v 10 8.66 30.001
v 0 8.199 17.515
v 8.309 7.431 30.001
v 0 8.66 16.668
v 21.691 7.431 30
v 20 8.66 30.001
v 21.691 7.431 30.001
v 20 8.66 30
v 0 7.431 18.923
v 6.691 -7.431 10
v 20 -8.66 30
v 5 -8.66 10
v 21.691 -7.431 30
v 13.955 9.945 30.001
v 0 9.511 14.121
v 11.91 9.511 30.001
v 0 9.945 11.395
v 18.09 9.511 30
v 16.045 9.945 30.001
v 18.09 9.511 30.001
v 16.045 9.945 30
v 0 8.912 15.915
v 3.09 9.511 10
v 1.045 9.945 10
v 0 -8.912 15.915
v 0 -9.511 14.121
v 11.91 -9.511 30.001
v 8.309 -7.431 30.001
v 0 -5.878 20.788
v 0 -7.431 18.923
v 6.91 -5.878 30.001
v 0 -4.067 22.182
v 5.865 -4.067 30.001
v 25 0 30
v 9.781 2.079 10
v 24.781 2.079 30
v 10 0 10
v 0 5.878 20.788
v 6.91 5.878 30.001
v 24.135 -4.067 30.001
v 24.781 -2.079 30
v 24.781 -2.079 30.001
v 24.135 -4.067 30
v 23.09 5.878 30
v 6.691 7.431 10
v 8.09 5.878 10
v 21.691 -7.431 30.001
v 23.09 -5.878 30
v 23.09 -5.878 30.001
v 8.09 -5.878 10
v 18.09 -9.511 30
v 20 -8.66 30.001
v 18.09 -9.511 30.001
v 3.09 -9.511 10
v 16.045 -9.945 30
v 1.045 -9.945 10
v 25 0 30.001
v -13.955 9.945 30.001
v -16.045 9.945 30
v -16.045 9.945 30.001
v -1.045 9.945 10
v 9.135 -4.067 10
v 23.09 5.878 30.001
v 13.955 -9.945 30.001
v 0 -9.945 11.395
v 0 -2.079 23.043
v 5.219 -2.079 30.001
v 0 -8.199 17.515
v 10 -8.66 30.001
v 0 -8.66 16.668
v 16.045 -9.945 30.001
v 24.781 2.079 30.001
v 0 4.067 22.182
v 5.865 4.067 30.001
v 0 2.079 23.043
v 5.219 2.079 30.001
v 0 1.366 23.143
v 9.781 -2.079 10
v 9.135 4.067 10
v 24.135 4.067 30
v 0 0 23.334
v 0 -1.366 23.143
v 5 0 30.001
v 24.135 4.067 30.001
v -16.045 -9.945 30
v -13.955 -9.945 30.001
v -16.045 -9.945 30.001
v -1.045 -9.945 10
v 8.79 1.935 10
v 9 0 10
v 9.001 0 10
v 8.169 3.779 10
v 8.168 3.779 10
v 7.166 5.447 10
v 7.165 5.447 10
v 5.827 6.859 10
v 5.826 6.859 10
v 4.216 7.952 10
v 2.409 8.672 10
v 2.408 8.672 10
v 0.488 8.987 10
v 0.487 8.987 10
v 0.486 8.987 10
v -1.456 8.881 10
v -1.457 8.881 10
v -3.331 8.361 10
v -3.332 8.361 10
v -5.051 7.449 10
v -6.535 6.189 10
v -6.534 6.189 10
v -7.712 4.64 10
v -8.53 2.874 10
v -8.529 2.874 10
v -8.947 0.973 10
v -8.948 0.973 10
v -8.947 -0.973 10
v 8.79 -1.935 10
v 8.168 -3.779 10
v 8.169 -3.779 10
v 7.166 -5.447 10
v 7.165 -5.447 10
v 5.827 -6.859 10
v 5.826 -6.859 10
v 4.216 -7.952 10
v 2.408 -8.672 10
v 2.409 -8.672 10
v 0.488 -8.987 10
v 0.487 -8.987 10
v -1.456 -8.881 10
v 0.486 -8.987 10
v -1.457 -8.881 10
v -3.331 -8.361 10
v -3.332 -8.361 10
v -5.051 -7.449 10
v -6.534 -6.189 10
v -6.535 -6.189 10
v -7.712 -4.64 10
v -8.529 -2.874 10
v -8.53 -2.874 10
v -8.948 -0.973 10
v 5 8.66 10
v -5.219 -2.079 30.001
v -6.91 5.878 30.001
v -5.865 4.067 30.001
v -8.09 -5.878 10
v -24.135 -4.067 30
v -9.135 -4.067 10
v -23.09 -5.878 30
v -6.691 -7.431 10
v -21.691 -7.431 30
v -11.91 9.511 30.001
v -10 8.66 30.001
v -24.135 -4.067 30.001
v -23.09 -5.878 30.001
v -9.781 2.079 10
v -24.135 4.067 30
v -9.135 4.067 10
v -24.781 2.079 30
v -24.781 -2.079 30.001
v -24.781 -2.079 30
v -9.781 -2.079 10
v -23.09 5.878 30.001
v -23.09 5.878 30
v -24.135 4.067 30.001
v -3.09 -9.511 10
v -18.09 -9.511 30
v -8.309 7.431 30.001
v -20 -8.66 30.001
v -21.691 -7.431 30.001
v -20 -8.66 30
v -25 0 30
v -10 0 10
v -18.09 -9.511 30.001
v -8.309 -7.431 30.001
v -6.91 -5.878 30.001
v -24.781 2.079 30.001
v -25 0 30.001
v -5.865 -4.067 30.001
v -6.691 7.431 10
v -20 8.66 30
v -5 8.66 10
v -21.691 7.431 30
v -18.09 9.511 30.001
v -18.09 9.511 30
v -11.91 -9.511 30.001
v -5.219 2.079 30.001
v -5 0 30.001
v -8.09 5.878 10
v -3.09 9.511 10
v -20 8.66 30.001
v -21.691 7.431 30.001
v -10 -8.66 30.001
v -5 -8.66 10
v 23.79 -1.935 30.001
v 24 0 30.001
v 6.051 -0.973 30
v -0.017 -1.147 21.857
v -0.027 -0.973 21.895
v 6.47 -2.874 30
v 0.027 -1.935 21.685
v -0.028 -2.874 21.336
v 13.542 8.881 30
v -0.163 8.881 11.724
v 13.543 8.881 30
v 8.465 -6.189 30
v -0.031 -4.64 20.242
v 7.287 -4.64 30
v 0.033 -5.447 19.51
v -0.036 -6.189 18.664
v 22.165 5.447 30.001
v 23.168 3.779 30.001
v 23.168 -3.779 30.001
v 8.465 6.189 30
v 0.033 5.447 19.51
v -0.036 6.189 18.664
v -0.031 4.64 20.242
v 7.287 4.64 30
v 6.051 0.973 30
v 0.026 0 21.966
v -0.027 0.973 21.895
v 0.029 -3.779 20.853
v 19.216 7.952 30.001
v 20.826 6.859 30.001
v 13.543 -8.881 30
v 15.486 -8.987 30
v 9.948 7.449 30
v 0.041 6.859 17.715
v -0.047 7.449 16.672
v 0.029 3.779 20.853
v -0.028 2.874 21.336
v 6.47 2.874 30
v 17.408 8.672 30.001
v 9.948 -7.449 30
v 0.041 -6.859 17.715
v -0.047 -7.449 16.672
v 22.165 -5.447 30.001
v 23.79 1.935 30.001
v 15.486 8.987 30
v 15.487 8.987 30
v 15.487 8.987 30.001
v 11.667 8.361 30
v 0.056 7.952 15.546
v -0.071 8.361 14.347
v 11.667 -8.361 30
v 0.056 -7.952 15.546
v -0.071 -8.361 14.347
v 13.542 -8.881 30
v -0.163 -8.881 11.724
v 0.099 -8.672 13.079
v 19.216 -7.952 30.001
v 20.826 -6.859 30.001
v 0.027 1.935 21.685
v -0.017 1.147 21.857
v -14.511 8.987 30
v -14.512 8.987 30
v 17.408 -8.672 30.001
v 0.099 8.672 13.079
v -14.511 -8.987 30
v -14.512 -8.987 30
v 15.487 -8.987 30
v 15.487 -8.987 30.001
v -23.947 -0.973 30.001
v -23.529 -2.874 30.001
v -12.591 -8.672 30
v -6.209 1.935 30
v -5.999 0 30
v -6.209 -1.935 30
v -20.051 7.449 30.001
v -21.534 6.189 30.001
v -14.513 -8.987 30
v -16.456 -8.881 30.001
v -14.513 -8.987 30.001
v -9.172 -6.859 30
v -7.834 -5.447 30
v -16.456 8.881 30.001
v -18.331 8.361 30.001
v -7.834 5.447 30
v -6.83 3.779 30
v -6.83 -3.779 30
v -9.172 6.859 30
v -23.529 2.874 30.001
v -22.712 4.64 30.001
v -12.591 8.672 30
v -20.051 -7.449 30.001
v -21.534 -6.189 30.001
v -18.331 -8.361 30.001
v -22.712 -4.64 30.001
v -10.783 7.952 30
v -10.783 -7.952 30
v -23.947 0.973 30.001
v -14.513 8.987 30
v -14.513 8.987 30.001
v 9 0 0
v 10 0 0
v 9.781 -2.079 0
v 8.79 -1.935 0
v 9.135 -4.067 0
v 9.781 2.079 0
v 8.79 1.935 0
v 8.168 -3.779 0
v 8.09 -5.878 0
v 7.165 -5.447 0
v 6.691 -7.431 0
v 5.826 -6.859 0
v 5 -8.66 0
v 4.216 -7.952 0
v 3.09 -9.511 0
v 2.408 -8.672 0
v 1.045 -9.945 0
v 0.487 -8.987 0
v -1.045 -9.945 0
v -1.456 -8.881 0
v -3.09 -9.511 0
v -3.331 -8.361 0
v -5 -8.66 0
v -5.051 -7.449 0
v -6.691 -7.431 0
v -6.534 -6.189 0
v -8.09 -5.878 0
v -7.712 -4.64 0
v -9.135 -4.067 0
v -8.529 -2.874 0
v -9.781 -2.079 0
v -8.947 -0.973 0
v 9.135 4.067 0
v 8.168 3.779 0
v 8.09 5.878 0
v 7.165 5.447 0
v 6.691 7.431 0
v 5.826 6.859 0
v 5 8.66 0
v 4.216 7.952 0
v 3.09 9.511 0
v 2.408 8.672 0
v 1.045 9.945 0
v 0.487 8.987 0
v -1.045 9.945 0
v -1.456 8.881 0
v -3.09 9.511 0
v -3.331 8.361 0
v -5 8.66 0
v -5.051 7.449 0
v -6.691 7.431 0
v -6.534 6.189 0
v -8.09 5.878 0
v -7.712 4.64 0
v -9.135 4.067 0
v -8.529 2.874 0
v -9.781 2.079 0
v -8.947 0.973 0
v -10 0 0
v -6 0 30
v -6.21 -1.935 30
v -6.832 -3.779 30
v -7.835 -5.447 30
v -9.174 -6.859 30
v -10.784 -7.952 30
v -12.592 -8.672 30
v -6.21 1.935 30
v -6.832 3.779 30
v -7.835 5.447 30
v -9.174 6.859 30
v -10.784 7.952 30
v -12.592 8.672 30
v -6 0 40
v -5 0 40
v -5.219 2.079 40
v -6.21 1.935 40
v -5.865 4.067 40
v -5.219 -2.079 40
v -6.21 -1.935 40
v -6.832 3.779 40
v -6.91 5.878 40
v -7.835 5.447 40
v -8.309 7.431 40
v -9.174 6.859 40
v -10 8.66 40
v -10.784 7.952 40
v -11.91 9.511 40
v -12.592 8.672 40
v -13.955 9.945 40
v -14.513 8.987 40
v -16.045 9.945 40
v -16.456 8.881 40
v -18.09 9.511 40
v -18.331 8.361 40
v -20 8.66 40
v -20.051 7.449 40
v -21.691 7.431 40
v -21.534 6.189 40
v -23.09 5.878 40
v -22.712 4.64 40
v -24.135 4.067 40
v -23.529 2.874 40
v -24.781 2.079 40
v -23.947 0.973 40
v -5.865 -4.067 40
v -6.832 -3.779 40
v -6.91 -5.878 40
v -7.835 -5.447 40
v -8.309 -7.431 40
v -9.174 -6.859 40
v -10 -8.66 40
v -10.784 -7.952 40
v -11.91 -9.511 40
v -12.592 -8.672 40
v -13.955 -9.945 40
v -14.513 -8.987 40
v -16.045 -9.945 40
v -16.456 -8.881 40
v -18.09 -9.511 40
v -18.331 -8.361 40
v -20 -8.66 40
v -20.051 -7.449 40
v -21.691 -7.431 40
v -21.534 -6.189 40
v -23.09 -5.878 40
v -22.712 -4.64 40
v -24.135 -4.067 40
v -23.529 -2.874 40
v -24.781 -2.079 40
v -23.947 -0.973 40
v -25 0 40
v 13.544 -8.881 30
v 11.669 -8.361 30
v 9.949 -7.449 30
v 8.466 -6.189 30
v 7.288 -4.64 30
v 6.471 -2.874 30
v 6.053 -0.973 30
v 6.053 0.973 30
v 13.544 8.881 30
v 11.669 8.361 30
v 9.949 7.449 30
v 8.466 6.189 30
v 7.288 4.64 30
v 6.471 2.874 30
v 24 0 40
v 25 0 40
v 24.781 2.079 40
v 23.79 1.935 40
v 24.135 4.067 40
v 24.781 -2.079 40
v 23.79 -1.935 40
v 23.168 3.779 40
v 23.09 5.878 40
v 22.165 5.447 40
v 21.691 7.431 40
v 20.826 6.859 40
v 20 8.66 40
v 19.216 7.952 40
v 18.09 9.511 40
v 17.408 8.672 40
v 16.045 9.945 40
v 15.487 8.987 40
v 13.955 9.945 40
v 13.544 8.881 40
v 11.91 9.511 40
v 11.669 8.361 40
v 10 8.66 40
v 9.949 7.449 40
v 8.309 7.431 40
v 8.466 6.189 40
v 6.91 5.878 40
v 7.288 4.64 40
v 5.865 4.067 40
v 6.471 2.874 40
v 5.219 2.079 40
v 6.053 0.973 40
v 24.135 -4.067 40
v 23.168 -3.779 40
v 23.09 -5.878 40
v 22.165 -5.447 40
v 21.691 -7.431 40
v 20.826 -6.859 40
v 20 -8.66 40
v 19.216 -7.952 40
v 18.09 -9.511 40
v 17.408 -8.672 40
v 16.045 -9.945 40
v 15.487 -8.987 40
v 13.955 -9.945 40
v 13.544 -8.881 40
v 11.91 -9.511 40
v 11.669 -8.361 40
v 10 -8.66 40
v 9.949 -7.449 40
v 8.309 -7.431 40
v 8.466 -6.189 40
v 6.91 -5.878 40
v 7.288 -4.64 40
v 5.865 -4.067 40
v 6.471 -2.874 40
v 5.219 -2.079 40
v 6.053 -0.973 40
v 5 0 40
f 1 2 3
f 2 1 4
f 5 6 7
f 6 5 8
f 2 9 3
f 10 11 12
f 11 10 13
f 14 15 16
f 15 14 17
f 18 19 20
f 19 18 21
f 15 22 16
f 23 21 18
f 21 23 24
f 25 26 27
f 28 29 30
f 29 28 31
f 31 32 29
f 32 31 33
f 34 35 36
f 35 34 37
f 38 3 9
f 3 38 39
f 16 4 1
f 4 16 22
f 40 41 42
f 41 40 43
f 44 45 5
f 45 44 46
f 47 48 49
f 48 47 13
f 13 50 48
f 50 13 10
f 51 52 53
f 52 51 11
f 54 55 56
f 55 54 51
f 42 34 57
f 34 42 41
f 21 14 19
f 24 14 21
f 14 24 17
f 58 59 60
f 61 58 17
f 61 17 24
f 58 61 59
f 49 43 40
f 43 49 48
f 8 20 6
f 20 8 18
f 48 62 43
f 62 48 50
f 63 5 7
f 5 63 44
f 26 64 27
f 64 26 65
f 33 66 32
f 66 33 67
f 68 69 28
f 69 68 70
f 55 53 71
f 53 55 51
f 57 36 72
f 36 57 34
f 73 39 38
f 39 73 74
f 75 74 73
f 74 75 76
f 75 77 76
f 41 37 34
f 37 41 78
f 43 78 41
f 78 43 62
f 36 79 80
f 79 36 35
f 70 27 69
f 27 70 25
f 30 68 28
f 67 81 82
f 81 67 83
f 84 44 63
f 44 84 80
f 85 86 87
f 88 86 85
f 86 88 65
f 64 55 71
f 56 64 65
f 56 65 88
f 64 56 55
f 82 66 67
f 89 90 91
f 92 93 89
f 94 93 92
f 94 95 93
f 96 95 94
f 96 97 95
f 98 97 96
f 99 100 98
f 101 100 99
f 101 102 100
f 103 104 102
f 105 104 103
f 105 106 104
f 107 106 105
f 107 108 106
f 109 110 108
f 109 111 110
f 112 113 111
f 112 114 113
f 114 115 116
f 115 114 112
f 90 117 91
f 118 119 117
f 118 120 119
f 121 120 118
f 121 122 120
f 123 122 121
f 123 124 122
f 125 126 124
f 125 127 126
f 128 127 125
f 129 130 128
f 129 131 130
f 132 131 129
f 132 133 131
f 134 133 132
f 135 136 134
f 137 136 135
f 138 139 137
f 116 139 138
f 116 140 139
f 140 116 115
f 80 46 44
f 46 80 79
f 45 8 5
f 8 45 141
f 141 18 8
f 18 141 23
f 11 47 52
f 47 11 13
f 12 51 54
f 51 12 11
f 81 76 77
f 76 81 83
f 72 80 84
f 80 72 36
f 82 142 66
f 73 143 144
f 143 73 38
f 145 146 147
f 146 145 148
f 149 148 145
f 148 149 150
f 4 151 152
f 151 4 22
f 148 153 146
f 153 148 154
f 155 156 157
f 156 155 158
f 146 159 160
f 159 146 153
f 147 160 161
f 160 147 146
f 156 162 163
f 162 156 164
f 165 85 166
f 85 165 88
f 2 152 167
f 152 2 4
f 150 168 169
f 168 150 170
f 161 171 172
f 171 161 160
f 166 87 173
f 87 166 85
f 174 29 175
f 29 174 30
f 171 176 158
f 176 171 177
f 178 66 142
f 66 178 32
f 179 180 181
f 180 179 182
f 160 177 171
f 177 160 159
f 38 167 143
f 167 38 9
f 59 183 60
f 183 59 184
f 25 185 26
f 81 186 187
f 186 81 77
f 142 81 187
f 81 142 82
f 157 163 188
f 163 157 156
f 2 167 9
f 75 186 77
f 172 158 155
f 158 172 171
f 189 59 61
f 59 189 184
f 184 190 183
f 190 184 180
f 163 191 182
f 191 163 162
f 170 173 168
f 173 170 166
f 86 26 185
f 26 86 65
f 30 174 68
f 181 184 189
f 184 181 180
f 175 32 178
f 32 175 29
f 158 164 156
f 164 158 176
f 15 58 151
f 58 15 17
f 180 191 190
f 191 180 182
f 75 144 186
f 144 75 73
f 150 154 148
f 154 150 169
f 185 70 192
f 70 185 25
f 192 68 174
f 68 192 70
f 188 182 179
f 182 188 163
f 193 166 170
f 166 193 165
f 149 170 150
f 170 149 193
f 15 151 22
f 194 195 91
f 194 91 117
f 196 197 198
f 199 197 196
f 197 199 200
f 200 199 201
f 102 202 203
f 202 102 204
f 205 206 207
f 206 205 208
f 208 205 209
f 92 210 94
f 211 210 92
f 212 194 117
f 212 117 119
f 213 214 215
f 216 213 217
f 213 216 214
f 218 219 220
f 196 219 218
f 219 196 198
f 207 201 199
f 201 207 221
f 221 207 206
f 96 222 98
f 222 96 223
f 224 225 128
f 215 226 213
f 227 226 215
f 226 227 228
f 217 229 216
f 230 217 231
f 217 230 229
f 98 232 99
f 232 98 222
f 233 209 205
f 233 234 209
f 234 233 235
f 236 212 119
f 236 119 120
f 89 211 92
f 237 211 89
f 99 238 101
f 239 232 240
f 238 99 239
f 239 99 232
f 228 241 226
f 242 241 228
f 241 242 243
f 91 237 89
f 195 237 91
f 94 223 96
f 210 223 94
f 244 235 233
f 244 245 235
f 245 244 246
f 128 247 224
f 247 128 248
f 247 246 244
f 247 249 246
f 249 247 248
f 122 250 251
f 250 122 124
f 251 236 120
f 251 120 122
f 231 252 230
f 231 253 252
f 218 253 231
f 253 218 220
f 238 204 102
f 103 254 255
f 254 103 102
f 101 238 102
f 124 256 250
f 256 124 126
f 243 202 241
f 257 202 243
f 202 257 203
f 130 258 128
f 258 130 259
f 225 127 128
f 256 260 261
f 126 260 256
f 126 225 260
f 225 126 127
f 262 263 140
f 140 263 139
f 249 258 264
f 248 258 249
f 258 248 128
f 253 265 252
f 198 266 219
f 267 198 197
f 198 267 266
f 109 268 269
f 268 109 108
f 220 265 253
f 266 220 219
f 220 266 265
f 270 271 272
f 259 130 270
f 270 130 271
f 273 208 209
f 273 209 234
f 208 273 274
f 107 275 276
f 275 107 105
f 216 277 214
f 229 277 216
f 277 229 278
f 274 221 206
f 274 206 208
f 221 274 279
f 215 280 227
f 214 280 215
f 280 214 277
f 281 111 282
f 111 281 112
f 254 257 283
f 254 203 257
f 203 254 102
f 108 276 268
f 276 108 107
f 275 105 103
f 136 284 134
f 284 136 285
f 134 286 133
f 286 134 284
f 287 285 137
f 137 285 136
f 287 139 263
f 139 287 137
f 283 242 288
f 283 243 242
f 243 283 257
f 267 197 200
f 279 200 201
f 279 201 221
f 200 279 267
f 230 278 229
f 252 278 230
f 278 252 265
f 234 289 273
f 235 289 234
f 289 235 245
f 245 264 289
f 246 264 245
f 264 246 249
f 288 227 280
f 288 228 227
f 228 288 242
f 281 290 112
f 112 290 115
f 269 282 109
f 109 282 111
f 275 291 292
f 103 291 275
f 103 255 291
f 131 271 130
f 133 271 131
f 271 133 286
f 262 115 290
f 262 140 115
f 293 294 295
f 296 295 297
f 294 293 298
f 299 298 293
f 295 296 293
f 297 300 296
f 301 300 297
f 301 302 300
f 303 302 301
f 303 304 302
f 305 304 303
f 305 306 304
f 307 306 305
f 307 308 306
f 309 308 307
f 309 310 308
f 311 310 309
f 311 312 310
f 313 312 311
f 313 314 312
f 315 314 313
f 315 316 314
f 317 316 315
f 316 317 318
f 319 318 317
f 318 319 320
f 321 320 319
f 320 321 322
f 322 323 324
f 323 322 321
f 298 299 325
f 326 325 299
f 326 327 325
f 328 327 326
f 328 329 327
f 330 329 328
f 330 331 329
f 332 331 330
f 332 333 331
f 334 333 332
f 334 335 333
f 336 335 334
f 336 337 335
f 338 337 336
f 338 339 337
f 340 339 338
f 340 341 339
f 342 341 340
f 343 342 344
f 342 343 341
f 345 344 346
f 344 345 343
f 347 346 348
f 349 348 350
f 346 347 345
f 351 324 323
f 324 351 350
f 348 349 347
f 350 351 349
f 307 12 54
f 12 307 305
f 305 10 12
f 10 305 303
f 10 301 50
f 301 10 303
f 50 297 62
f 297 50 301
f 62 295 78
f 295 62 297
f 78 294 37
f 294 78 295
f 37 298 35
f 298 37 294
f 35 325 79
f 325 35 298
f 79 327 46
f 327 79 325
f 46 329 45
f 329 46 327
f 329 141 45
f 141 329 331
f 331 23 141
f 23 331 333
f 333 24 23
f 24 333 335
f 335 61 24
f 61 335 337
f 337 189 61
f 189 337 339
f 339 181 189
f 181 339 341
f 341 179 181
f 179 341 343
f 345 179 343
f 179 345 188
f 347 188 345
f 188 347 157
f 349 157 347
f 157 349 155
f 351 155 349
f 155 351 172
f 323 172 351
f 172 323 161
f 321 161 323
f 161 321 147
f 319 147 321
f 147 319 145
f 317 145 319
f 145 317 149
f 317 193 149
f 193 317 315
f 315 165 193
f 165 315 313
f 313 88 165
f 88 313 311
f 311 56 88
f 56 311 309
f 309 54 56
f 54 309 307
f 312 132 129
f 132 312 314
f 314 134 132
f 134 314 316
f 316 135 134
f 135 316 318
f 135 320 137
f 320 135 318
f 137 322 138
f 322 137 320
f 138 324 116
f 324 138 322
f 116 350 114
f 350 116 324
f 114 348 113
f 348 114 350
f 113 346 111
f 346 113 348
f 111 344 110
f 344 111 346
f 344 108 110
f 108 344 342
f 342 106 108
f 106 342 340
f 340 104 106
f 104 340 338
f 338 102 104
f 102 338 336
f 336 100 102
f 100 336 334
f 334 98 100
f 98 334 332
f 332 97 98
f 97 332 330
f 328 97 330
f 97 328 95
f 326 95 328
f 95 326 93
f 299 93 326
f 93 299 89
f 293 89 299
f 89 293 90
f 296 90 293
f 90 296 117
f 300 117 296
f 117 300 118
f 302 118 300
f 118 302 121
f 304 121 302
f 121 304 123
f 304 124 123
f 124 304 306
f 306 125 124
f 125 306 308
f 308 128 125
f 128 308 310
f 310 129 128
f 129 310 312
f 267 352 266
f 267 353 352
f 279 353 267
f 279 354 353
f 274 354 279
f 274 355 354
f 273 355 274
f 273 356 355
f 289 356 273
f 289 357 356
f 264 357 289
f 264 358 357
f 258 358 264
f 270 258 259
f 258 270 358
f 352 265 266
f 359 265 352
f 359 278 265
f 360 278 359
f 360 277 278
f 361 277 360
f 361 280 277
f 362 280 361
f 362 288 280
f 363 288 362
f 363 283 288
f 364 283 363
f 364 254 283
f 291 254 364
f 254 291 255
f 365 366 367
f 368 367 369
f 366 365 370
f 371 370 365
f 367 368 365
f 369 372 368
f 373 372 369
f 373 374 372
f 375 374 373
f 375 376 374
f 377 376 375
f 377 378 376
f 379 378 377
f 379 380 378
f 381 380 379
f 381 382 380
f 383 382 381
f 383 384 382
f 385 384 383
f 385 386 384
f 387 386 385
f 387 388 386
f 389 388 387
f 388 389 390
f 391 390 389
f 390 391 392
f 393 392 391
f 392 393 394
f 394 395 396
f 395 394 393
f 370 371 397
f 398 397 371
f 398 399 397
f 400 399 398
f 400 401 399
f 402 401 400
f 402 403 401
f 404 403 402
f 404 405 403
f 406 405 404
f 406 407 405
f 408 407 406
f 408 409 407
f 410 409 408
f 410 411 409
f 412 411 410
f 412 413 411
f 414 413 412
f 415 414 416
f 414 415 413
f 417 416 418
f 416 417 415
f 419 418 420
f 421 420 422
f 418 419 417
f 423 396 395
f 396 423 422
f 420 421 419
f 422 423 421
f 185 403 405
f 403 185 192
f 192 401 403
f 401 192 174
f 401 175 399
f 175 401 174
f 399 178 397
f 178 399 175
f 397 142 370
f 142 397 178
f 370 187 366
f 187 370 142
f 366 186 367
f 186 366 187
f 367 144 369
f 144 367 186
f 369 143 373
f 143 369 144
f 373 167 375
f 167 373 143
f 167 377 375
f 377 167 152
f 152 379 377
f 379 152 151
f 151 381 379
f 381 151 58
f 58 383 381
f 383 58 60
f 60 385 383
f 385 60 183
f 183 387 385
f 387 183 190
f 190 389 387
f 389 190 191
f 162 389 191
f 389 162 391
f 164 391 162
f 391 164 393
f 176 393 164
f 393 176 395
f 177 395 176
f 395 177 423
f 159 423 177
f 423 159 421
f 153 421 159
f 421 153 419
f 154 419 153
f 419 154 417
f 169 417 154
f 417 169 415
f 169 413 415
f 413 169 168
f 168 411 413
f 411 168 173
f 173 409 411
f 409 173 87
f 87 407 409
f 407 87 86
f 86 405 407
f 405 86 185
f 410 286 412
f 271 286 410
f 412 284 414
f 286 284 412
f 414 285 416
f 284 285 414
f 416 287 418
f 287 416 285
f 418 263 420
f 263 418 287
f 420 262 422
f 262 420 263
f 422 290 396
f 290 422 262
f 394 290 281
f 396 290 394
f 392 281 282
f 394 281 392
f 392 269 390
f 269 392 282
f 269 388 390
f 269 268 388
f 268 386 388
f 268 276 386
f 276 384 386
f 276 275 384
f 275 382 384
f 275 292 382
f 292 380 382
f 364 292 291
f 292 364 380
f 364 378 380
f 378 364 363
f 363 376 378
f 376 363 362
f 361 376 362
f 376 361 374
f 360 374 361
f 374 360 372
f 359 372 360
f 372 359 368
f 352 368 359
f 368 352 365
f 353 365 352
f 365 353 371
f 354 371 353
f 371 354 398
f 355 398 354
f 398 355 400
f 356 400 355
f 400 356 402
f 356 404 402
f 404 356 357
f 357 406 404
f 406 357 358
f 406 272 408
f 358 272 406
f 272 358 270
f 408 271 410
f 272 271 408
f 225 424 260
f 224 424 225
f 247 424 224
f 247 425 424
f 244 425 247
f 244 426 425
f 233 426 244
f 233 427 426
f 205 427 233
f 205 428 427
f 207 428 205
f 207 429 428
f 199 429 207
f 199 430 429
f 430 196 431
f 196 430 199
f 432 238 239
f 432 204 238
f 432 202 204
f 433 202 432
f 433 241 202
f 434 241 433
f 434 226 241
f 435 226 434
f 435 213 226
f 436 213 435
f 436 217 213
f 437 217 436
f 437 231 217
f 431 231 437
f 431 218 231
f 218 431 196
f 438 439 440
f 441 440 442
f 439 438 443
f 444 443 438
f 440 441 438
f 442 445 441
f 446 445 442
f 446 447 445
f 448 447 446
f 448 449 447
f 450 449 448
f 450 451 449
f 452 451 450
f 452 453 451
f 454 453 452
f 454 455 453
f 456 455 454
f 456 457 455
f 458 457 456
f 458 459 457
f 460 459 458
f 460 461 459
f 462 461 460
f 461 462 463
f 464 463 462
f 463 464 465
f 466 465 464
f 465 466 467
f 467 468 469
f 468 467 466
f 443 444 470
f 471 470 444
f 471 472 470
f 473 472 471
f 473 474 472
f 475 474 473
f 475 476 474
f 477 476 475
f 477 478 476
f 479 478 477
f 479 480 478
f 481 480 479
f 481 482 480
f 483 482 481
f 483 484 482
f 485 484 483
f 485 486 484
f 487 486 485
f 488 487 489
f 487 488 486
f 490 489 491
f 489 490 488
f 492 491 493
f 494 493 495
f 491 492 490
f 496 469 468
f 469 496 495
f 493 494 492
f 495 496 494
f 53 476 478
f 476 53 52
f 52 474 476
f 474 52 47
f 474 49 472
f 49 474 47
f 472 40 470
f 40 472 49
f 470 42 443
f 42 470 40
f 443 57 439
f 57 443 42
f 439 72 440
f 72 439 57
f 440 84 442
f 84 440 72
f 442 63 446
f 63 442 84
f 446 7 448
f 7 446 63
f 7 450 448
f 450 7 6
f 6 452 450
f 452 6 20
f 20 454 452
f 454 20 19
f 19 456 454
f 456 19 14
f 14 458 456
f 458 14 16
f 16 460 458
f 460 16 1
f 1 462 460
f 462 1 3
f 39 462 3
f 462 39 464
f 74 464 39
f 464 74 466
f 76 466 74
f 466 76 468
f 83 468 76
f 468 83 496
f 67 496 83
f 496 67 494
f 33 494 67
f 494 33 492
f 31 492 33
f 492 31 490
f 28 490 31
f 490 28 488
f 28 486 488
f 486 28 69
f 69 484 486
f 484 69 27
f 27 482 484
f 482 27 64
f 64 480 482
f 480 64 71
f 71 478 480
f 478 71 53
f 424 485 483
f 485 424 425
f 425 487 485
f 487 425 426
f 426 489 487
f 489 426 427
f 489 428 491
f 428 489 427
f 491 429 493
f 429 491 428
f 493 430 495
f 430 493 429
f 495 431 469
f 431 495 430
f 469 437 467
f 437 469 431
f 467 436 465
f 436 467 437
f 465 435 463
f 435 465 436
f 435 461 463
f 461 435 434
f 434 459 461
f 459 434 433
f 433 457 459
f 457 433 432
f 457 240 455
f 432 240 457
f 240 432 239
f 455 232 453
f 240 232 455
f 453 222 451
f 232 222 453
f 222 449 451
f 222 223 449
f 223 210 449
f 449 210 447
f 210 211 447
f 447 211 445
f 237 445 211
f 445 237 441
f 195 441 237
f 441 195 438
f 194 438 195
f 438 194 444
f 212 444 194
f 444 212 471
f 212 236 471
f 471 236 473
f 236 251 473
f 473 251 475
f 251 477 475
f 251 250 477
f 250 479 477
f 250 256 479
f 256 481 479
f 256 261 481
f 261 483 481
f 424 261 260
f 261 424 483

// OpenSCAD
/**
 * Modules to produce Rings, Pipes and Y Pipes.
 */

/**
 * Create a ring given radius and wall thickness
 */
module Ring(radius=10, 
            wall_thickness=1) {
    difference() {
        circle(radius); 
        circle(radius - wall_thickness);
    }
}

/**
 * Create a Pipe given radius, height and wall thickness
 */
module Pipe(radius=10, 
            height=10, 
            wall_thickness=1) {
    linear_extrude(height=height) Ring(radius, wall_thickness);
}

/**
 * Create an Y Pipe given its radius, total height, y spacing, wall thickness and top and bottom extensions.
 */
module YPipe(radius=10, 
             total_height=40, 
             y_spacing=10, 
             wall_thickness=1, 
             top_extension=10, 
             bottom_extension=10) {
    height = total_height - top_extension - bottom_extension;
    topw = y_spacing + 2 * radius;
    Pipe(radius, bottom_extension, wall_thickness);
    translate([0, 0, bottom_extension]) difference() {
        union() {
            hull() {
                cylinder(0.001, radius, radius);
                translate([topw/2, 0, height]) cylinder(0.001, radius, radius);
            }
            hull() {
                cylinder(0.001, radius, radius);
                translate([-(topw/2), 0, height]) cylinder(0.001, radius, radius);
            }
        }
        union() {
            hull() {
                translate([0, 0, -0.001]) cylinder(0.001, radius - wall_thickness, radius - wall_thickness);
                translate([topw/2, 0, height+0.001]) cylinder(0.001, radius - wall_thickness, radius - wall_thickness);
            }
            hull() {
                translate([0, 0, -0.001]) cylinder(0.001, radius - wall_thickness, radius - wall_thickness);
                translate([-(topw/2), 0, height+0.001]) cylinder(0.001, radius - wall_thickness, radius - wall_thickness);
            }
        }
    }
    translate([-(topw/2), 0, bottom_extension + height]) Pipe(radius, top_extension, wall_thickness);
    translate([(topw/2), 0, bottom_extension + height]) Pipe(radius, top_extension, wall_thickness);
}

YPipe();
